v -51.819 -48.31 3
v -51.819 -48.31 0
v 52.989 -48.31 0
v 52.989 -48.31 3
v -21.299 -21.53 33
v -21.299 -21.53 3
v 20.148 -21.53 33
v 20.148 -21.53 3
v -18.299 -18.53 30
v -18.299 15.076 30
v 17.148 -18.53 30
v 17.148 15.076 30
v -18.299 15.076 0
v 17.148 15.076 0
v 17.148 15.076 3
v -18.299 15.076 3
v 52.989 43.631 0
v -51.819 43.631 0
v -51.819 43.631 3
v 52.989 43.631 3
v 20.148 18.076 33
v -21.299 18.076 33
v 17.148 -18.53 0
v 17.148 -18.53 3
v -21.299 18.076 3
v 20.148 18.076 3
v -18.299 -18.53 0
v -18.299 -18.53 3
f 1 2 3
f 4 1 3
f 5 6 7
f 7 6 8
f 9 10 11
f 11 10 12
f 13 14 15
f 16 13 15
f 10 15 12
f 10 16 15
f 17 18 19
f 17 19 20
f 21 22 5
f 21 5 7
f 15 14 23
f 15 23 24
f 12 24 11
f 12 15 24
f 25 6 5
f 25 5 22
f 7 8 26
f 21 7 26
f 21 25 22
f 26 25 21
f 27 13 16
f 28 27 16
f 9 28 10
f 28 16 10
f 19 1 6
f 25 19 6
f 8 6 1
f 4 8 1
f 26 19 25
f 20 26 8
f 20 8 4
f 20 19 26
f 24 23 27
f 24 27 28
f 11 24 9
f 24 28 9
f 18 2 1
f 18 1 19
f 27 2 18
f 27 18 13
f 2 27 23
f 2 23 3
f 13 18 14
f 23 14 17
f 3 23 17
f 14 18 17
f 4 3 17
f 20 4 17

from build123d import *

# Parameters (mm, degrees)
F0_W        = 104.8084236681
F0_H        = 91.941319406
F1_DEPTH    = 3
F2_W        = 41.4473675191
F2_H        = 39.6052636206
F3_DEPTH    = 30
F4_T        = 3
F4_T3_DEPTH = 47.4473675191
F4_T5_DEPTH = 45.6052636206


# Not quite as in the source:
# - a shell that OpenCascade refuses in one call is made with other operations: the cavity is built on its own and cut out


with BuildPart() as f1:
    # F0 (on Top) → F1 (new body)
    with BuildSketch(Plane.XY):
        with Locations((0.5848687142, -2.3394748569)):
            Rectangle(F0_W, F0_H)
    extrude(amount=F1_DEPTH)

    # F2 (on face) → F3 (join)
    with BuildSketch(Plane.XY.offset(3)):
        with Locations((-0.575657934, -1.7269738019)):
            Rectangle(F2_W, F2_H)
    extrude(amount=F3_DEPTH)

    # F4: shell of thickness 3, made by hand


with BuildPart() as f4_core1:
    # F4_t2: copy of F1
    add(f1.part)

    # the walls: a layer under each face that stays
    f4_faces = [f4_core1.faces().sort_by_distance(p)[0] for p in [
        (0.5848687142, 43.6311848462, 1.5),
        (52.9890805483, -2.3394748569, 1.5),
        (-51.8193431199, -2.3394748569, 1.5),
        (-34.3512725085, -32.9865813255, 3),
        (0.5848687142, -48.3101345599, 1.5),
        (-0.575657934, 18.0756580085, 18),
        (-21.2993416935, -1.7269738019, 18),
        (-0.575657934, -21.5296056122, 18),
        (20.1480258256, -1.7269738019, 18),
        (-0.575657934, -1.7269738019, 33),
    ]]
    thicken(f4_faces, amount=-F4_T, mode=Mode.SUBTRACT)

    # F4_s4 → F4_t3 (cut)
    with BuildSketch(Plane.YZ.offset(-24.2993416935)):
        Polygon((18.1056580085, 3.03), (18.0756580085, 0), (15.0756580085, 0), (15.0756580085, 3), align=None)
        Polygon((-21.5596056122, 3.03), (-21.5296056122, 0), (-18.5296056122, 0), (-18.5296056122, 3), align=None)
    extrude(amount=F4_T3_DEPTH, mode=Mode.SUBTRACT)

    # F4_s6 → F4_t5 (cut)
    with BuildSketch(Plane.XZ.offset(-21.0756580085)):
        Polygon((-21.3293416935, 3.03), (-21.2993416935, 0), (-18.2993416935, 0), (-18.2993416935, 3), align=None)
        Polygon((20.1780258256, 3.03), (20.1480258256, 0), (17.1480258256, 0), (17.1480258256, 3), align=None)
    extrude(amount=F4_T5_DEPTH, mode=Mode.SUBTRACT)


with BuildPart() as f1_1:
    add(f1.part)

    # what is left inside the walls is the cavity
    f4_cavity = [f4_core1.part.solids().sort_by_distance(p)[0] for p in [
        (-0.575658, -7.327851, 0.03),
    ]]
    add(f4_cavity, mode=Mode.SUBTRACT)


solid = f1_1.part
